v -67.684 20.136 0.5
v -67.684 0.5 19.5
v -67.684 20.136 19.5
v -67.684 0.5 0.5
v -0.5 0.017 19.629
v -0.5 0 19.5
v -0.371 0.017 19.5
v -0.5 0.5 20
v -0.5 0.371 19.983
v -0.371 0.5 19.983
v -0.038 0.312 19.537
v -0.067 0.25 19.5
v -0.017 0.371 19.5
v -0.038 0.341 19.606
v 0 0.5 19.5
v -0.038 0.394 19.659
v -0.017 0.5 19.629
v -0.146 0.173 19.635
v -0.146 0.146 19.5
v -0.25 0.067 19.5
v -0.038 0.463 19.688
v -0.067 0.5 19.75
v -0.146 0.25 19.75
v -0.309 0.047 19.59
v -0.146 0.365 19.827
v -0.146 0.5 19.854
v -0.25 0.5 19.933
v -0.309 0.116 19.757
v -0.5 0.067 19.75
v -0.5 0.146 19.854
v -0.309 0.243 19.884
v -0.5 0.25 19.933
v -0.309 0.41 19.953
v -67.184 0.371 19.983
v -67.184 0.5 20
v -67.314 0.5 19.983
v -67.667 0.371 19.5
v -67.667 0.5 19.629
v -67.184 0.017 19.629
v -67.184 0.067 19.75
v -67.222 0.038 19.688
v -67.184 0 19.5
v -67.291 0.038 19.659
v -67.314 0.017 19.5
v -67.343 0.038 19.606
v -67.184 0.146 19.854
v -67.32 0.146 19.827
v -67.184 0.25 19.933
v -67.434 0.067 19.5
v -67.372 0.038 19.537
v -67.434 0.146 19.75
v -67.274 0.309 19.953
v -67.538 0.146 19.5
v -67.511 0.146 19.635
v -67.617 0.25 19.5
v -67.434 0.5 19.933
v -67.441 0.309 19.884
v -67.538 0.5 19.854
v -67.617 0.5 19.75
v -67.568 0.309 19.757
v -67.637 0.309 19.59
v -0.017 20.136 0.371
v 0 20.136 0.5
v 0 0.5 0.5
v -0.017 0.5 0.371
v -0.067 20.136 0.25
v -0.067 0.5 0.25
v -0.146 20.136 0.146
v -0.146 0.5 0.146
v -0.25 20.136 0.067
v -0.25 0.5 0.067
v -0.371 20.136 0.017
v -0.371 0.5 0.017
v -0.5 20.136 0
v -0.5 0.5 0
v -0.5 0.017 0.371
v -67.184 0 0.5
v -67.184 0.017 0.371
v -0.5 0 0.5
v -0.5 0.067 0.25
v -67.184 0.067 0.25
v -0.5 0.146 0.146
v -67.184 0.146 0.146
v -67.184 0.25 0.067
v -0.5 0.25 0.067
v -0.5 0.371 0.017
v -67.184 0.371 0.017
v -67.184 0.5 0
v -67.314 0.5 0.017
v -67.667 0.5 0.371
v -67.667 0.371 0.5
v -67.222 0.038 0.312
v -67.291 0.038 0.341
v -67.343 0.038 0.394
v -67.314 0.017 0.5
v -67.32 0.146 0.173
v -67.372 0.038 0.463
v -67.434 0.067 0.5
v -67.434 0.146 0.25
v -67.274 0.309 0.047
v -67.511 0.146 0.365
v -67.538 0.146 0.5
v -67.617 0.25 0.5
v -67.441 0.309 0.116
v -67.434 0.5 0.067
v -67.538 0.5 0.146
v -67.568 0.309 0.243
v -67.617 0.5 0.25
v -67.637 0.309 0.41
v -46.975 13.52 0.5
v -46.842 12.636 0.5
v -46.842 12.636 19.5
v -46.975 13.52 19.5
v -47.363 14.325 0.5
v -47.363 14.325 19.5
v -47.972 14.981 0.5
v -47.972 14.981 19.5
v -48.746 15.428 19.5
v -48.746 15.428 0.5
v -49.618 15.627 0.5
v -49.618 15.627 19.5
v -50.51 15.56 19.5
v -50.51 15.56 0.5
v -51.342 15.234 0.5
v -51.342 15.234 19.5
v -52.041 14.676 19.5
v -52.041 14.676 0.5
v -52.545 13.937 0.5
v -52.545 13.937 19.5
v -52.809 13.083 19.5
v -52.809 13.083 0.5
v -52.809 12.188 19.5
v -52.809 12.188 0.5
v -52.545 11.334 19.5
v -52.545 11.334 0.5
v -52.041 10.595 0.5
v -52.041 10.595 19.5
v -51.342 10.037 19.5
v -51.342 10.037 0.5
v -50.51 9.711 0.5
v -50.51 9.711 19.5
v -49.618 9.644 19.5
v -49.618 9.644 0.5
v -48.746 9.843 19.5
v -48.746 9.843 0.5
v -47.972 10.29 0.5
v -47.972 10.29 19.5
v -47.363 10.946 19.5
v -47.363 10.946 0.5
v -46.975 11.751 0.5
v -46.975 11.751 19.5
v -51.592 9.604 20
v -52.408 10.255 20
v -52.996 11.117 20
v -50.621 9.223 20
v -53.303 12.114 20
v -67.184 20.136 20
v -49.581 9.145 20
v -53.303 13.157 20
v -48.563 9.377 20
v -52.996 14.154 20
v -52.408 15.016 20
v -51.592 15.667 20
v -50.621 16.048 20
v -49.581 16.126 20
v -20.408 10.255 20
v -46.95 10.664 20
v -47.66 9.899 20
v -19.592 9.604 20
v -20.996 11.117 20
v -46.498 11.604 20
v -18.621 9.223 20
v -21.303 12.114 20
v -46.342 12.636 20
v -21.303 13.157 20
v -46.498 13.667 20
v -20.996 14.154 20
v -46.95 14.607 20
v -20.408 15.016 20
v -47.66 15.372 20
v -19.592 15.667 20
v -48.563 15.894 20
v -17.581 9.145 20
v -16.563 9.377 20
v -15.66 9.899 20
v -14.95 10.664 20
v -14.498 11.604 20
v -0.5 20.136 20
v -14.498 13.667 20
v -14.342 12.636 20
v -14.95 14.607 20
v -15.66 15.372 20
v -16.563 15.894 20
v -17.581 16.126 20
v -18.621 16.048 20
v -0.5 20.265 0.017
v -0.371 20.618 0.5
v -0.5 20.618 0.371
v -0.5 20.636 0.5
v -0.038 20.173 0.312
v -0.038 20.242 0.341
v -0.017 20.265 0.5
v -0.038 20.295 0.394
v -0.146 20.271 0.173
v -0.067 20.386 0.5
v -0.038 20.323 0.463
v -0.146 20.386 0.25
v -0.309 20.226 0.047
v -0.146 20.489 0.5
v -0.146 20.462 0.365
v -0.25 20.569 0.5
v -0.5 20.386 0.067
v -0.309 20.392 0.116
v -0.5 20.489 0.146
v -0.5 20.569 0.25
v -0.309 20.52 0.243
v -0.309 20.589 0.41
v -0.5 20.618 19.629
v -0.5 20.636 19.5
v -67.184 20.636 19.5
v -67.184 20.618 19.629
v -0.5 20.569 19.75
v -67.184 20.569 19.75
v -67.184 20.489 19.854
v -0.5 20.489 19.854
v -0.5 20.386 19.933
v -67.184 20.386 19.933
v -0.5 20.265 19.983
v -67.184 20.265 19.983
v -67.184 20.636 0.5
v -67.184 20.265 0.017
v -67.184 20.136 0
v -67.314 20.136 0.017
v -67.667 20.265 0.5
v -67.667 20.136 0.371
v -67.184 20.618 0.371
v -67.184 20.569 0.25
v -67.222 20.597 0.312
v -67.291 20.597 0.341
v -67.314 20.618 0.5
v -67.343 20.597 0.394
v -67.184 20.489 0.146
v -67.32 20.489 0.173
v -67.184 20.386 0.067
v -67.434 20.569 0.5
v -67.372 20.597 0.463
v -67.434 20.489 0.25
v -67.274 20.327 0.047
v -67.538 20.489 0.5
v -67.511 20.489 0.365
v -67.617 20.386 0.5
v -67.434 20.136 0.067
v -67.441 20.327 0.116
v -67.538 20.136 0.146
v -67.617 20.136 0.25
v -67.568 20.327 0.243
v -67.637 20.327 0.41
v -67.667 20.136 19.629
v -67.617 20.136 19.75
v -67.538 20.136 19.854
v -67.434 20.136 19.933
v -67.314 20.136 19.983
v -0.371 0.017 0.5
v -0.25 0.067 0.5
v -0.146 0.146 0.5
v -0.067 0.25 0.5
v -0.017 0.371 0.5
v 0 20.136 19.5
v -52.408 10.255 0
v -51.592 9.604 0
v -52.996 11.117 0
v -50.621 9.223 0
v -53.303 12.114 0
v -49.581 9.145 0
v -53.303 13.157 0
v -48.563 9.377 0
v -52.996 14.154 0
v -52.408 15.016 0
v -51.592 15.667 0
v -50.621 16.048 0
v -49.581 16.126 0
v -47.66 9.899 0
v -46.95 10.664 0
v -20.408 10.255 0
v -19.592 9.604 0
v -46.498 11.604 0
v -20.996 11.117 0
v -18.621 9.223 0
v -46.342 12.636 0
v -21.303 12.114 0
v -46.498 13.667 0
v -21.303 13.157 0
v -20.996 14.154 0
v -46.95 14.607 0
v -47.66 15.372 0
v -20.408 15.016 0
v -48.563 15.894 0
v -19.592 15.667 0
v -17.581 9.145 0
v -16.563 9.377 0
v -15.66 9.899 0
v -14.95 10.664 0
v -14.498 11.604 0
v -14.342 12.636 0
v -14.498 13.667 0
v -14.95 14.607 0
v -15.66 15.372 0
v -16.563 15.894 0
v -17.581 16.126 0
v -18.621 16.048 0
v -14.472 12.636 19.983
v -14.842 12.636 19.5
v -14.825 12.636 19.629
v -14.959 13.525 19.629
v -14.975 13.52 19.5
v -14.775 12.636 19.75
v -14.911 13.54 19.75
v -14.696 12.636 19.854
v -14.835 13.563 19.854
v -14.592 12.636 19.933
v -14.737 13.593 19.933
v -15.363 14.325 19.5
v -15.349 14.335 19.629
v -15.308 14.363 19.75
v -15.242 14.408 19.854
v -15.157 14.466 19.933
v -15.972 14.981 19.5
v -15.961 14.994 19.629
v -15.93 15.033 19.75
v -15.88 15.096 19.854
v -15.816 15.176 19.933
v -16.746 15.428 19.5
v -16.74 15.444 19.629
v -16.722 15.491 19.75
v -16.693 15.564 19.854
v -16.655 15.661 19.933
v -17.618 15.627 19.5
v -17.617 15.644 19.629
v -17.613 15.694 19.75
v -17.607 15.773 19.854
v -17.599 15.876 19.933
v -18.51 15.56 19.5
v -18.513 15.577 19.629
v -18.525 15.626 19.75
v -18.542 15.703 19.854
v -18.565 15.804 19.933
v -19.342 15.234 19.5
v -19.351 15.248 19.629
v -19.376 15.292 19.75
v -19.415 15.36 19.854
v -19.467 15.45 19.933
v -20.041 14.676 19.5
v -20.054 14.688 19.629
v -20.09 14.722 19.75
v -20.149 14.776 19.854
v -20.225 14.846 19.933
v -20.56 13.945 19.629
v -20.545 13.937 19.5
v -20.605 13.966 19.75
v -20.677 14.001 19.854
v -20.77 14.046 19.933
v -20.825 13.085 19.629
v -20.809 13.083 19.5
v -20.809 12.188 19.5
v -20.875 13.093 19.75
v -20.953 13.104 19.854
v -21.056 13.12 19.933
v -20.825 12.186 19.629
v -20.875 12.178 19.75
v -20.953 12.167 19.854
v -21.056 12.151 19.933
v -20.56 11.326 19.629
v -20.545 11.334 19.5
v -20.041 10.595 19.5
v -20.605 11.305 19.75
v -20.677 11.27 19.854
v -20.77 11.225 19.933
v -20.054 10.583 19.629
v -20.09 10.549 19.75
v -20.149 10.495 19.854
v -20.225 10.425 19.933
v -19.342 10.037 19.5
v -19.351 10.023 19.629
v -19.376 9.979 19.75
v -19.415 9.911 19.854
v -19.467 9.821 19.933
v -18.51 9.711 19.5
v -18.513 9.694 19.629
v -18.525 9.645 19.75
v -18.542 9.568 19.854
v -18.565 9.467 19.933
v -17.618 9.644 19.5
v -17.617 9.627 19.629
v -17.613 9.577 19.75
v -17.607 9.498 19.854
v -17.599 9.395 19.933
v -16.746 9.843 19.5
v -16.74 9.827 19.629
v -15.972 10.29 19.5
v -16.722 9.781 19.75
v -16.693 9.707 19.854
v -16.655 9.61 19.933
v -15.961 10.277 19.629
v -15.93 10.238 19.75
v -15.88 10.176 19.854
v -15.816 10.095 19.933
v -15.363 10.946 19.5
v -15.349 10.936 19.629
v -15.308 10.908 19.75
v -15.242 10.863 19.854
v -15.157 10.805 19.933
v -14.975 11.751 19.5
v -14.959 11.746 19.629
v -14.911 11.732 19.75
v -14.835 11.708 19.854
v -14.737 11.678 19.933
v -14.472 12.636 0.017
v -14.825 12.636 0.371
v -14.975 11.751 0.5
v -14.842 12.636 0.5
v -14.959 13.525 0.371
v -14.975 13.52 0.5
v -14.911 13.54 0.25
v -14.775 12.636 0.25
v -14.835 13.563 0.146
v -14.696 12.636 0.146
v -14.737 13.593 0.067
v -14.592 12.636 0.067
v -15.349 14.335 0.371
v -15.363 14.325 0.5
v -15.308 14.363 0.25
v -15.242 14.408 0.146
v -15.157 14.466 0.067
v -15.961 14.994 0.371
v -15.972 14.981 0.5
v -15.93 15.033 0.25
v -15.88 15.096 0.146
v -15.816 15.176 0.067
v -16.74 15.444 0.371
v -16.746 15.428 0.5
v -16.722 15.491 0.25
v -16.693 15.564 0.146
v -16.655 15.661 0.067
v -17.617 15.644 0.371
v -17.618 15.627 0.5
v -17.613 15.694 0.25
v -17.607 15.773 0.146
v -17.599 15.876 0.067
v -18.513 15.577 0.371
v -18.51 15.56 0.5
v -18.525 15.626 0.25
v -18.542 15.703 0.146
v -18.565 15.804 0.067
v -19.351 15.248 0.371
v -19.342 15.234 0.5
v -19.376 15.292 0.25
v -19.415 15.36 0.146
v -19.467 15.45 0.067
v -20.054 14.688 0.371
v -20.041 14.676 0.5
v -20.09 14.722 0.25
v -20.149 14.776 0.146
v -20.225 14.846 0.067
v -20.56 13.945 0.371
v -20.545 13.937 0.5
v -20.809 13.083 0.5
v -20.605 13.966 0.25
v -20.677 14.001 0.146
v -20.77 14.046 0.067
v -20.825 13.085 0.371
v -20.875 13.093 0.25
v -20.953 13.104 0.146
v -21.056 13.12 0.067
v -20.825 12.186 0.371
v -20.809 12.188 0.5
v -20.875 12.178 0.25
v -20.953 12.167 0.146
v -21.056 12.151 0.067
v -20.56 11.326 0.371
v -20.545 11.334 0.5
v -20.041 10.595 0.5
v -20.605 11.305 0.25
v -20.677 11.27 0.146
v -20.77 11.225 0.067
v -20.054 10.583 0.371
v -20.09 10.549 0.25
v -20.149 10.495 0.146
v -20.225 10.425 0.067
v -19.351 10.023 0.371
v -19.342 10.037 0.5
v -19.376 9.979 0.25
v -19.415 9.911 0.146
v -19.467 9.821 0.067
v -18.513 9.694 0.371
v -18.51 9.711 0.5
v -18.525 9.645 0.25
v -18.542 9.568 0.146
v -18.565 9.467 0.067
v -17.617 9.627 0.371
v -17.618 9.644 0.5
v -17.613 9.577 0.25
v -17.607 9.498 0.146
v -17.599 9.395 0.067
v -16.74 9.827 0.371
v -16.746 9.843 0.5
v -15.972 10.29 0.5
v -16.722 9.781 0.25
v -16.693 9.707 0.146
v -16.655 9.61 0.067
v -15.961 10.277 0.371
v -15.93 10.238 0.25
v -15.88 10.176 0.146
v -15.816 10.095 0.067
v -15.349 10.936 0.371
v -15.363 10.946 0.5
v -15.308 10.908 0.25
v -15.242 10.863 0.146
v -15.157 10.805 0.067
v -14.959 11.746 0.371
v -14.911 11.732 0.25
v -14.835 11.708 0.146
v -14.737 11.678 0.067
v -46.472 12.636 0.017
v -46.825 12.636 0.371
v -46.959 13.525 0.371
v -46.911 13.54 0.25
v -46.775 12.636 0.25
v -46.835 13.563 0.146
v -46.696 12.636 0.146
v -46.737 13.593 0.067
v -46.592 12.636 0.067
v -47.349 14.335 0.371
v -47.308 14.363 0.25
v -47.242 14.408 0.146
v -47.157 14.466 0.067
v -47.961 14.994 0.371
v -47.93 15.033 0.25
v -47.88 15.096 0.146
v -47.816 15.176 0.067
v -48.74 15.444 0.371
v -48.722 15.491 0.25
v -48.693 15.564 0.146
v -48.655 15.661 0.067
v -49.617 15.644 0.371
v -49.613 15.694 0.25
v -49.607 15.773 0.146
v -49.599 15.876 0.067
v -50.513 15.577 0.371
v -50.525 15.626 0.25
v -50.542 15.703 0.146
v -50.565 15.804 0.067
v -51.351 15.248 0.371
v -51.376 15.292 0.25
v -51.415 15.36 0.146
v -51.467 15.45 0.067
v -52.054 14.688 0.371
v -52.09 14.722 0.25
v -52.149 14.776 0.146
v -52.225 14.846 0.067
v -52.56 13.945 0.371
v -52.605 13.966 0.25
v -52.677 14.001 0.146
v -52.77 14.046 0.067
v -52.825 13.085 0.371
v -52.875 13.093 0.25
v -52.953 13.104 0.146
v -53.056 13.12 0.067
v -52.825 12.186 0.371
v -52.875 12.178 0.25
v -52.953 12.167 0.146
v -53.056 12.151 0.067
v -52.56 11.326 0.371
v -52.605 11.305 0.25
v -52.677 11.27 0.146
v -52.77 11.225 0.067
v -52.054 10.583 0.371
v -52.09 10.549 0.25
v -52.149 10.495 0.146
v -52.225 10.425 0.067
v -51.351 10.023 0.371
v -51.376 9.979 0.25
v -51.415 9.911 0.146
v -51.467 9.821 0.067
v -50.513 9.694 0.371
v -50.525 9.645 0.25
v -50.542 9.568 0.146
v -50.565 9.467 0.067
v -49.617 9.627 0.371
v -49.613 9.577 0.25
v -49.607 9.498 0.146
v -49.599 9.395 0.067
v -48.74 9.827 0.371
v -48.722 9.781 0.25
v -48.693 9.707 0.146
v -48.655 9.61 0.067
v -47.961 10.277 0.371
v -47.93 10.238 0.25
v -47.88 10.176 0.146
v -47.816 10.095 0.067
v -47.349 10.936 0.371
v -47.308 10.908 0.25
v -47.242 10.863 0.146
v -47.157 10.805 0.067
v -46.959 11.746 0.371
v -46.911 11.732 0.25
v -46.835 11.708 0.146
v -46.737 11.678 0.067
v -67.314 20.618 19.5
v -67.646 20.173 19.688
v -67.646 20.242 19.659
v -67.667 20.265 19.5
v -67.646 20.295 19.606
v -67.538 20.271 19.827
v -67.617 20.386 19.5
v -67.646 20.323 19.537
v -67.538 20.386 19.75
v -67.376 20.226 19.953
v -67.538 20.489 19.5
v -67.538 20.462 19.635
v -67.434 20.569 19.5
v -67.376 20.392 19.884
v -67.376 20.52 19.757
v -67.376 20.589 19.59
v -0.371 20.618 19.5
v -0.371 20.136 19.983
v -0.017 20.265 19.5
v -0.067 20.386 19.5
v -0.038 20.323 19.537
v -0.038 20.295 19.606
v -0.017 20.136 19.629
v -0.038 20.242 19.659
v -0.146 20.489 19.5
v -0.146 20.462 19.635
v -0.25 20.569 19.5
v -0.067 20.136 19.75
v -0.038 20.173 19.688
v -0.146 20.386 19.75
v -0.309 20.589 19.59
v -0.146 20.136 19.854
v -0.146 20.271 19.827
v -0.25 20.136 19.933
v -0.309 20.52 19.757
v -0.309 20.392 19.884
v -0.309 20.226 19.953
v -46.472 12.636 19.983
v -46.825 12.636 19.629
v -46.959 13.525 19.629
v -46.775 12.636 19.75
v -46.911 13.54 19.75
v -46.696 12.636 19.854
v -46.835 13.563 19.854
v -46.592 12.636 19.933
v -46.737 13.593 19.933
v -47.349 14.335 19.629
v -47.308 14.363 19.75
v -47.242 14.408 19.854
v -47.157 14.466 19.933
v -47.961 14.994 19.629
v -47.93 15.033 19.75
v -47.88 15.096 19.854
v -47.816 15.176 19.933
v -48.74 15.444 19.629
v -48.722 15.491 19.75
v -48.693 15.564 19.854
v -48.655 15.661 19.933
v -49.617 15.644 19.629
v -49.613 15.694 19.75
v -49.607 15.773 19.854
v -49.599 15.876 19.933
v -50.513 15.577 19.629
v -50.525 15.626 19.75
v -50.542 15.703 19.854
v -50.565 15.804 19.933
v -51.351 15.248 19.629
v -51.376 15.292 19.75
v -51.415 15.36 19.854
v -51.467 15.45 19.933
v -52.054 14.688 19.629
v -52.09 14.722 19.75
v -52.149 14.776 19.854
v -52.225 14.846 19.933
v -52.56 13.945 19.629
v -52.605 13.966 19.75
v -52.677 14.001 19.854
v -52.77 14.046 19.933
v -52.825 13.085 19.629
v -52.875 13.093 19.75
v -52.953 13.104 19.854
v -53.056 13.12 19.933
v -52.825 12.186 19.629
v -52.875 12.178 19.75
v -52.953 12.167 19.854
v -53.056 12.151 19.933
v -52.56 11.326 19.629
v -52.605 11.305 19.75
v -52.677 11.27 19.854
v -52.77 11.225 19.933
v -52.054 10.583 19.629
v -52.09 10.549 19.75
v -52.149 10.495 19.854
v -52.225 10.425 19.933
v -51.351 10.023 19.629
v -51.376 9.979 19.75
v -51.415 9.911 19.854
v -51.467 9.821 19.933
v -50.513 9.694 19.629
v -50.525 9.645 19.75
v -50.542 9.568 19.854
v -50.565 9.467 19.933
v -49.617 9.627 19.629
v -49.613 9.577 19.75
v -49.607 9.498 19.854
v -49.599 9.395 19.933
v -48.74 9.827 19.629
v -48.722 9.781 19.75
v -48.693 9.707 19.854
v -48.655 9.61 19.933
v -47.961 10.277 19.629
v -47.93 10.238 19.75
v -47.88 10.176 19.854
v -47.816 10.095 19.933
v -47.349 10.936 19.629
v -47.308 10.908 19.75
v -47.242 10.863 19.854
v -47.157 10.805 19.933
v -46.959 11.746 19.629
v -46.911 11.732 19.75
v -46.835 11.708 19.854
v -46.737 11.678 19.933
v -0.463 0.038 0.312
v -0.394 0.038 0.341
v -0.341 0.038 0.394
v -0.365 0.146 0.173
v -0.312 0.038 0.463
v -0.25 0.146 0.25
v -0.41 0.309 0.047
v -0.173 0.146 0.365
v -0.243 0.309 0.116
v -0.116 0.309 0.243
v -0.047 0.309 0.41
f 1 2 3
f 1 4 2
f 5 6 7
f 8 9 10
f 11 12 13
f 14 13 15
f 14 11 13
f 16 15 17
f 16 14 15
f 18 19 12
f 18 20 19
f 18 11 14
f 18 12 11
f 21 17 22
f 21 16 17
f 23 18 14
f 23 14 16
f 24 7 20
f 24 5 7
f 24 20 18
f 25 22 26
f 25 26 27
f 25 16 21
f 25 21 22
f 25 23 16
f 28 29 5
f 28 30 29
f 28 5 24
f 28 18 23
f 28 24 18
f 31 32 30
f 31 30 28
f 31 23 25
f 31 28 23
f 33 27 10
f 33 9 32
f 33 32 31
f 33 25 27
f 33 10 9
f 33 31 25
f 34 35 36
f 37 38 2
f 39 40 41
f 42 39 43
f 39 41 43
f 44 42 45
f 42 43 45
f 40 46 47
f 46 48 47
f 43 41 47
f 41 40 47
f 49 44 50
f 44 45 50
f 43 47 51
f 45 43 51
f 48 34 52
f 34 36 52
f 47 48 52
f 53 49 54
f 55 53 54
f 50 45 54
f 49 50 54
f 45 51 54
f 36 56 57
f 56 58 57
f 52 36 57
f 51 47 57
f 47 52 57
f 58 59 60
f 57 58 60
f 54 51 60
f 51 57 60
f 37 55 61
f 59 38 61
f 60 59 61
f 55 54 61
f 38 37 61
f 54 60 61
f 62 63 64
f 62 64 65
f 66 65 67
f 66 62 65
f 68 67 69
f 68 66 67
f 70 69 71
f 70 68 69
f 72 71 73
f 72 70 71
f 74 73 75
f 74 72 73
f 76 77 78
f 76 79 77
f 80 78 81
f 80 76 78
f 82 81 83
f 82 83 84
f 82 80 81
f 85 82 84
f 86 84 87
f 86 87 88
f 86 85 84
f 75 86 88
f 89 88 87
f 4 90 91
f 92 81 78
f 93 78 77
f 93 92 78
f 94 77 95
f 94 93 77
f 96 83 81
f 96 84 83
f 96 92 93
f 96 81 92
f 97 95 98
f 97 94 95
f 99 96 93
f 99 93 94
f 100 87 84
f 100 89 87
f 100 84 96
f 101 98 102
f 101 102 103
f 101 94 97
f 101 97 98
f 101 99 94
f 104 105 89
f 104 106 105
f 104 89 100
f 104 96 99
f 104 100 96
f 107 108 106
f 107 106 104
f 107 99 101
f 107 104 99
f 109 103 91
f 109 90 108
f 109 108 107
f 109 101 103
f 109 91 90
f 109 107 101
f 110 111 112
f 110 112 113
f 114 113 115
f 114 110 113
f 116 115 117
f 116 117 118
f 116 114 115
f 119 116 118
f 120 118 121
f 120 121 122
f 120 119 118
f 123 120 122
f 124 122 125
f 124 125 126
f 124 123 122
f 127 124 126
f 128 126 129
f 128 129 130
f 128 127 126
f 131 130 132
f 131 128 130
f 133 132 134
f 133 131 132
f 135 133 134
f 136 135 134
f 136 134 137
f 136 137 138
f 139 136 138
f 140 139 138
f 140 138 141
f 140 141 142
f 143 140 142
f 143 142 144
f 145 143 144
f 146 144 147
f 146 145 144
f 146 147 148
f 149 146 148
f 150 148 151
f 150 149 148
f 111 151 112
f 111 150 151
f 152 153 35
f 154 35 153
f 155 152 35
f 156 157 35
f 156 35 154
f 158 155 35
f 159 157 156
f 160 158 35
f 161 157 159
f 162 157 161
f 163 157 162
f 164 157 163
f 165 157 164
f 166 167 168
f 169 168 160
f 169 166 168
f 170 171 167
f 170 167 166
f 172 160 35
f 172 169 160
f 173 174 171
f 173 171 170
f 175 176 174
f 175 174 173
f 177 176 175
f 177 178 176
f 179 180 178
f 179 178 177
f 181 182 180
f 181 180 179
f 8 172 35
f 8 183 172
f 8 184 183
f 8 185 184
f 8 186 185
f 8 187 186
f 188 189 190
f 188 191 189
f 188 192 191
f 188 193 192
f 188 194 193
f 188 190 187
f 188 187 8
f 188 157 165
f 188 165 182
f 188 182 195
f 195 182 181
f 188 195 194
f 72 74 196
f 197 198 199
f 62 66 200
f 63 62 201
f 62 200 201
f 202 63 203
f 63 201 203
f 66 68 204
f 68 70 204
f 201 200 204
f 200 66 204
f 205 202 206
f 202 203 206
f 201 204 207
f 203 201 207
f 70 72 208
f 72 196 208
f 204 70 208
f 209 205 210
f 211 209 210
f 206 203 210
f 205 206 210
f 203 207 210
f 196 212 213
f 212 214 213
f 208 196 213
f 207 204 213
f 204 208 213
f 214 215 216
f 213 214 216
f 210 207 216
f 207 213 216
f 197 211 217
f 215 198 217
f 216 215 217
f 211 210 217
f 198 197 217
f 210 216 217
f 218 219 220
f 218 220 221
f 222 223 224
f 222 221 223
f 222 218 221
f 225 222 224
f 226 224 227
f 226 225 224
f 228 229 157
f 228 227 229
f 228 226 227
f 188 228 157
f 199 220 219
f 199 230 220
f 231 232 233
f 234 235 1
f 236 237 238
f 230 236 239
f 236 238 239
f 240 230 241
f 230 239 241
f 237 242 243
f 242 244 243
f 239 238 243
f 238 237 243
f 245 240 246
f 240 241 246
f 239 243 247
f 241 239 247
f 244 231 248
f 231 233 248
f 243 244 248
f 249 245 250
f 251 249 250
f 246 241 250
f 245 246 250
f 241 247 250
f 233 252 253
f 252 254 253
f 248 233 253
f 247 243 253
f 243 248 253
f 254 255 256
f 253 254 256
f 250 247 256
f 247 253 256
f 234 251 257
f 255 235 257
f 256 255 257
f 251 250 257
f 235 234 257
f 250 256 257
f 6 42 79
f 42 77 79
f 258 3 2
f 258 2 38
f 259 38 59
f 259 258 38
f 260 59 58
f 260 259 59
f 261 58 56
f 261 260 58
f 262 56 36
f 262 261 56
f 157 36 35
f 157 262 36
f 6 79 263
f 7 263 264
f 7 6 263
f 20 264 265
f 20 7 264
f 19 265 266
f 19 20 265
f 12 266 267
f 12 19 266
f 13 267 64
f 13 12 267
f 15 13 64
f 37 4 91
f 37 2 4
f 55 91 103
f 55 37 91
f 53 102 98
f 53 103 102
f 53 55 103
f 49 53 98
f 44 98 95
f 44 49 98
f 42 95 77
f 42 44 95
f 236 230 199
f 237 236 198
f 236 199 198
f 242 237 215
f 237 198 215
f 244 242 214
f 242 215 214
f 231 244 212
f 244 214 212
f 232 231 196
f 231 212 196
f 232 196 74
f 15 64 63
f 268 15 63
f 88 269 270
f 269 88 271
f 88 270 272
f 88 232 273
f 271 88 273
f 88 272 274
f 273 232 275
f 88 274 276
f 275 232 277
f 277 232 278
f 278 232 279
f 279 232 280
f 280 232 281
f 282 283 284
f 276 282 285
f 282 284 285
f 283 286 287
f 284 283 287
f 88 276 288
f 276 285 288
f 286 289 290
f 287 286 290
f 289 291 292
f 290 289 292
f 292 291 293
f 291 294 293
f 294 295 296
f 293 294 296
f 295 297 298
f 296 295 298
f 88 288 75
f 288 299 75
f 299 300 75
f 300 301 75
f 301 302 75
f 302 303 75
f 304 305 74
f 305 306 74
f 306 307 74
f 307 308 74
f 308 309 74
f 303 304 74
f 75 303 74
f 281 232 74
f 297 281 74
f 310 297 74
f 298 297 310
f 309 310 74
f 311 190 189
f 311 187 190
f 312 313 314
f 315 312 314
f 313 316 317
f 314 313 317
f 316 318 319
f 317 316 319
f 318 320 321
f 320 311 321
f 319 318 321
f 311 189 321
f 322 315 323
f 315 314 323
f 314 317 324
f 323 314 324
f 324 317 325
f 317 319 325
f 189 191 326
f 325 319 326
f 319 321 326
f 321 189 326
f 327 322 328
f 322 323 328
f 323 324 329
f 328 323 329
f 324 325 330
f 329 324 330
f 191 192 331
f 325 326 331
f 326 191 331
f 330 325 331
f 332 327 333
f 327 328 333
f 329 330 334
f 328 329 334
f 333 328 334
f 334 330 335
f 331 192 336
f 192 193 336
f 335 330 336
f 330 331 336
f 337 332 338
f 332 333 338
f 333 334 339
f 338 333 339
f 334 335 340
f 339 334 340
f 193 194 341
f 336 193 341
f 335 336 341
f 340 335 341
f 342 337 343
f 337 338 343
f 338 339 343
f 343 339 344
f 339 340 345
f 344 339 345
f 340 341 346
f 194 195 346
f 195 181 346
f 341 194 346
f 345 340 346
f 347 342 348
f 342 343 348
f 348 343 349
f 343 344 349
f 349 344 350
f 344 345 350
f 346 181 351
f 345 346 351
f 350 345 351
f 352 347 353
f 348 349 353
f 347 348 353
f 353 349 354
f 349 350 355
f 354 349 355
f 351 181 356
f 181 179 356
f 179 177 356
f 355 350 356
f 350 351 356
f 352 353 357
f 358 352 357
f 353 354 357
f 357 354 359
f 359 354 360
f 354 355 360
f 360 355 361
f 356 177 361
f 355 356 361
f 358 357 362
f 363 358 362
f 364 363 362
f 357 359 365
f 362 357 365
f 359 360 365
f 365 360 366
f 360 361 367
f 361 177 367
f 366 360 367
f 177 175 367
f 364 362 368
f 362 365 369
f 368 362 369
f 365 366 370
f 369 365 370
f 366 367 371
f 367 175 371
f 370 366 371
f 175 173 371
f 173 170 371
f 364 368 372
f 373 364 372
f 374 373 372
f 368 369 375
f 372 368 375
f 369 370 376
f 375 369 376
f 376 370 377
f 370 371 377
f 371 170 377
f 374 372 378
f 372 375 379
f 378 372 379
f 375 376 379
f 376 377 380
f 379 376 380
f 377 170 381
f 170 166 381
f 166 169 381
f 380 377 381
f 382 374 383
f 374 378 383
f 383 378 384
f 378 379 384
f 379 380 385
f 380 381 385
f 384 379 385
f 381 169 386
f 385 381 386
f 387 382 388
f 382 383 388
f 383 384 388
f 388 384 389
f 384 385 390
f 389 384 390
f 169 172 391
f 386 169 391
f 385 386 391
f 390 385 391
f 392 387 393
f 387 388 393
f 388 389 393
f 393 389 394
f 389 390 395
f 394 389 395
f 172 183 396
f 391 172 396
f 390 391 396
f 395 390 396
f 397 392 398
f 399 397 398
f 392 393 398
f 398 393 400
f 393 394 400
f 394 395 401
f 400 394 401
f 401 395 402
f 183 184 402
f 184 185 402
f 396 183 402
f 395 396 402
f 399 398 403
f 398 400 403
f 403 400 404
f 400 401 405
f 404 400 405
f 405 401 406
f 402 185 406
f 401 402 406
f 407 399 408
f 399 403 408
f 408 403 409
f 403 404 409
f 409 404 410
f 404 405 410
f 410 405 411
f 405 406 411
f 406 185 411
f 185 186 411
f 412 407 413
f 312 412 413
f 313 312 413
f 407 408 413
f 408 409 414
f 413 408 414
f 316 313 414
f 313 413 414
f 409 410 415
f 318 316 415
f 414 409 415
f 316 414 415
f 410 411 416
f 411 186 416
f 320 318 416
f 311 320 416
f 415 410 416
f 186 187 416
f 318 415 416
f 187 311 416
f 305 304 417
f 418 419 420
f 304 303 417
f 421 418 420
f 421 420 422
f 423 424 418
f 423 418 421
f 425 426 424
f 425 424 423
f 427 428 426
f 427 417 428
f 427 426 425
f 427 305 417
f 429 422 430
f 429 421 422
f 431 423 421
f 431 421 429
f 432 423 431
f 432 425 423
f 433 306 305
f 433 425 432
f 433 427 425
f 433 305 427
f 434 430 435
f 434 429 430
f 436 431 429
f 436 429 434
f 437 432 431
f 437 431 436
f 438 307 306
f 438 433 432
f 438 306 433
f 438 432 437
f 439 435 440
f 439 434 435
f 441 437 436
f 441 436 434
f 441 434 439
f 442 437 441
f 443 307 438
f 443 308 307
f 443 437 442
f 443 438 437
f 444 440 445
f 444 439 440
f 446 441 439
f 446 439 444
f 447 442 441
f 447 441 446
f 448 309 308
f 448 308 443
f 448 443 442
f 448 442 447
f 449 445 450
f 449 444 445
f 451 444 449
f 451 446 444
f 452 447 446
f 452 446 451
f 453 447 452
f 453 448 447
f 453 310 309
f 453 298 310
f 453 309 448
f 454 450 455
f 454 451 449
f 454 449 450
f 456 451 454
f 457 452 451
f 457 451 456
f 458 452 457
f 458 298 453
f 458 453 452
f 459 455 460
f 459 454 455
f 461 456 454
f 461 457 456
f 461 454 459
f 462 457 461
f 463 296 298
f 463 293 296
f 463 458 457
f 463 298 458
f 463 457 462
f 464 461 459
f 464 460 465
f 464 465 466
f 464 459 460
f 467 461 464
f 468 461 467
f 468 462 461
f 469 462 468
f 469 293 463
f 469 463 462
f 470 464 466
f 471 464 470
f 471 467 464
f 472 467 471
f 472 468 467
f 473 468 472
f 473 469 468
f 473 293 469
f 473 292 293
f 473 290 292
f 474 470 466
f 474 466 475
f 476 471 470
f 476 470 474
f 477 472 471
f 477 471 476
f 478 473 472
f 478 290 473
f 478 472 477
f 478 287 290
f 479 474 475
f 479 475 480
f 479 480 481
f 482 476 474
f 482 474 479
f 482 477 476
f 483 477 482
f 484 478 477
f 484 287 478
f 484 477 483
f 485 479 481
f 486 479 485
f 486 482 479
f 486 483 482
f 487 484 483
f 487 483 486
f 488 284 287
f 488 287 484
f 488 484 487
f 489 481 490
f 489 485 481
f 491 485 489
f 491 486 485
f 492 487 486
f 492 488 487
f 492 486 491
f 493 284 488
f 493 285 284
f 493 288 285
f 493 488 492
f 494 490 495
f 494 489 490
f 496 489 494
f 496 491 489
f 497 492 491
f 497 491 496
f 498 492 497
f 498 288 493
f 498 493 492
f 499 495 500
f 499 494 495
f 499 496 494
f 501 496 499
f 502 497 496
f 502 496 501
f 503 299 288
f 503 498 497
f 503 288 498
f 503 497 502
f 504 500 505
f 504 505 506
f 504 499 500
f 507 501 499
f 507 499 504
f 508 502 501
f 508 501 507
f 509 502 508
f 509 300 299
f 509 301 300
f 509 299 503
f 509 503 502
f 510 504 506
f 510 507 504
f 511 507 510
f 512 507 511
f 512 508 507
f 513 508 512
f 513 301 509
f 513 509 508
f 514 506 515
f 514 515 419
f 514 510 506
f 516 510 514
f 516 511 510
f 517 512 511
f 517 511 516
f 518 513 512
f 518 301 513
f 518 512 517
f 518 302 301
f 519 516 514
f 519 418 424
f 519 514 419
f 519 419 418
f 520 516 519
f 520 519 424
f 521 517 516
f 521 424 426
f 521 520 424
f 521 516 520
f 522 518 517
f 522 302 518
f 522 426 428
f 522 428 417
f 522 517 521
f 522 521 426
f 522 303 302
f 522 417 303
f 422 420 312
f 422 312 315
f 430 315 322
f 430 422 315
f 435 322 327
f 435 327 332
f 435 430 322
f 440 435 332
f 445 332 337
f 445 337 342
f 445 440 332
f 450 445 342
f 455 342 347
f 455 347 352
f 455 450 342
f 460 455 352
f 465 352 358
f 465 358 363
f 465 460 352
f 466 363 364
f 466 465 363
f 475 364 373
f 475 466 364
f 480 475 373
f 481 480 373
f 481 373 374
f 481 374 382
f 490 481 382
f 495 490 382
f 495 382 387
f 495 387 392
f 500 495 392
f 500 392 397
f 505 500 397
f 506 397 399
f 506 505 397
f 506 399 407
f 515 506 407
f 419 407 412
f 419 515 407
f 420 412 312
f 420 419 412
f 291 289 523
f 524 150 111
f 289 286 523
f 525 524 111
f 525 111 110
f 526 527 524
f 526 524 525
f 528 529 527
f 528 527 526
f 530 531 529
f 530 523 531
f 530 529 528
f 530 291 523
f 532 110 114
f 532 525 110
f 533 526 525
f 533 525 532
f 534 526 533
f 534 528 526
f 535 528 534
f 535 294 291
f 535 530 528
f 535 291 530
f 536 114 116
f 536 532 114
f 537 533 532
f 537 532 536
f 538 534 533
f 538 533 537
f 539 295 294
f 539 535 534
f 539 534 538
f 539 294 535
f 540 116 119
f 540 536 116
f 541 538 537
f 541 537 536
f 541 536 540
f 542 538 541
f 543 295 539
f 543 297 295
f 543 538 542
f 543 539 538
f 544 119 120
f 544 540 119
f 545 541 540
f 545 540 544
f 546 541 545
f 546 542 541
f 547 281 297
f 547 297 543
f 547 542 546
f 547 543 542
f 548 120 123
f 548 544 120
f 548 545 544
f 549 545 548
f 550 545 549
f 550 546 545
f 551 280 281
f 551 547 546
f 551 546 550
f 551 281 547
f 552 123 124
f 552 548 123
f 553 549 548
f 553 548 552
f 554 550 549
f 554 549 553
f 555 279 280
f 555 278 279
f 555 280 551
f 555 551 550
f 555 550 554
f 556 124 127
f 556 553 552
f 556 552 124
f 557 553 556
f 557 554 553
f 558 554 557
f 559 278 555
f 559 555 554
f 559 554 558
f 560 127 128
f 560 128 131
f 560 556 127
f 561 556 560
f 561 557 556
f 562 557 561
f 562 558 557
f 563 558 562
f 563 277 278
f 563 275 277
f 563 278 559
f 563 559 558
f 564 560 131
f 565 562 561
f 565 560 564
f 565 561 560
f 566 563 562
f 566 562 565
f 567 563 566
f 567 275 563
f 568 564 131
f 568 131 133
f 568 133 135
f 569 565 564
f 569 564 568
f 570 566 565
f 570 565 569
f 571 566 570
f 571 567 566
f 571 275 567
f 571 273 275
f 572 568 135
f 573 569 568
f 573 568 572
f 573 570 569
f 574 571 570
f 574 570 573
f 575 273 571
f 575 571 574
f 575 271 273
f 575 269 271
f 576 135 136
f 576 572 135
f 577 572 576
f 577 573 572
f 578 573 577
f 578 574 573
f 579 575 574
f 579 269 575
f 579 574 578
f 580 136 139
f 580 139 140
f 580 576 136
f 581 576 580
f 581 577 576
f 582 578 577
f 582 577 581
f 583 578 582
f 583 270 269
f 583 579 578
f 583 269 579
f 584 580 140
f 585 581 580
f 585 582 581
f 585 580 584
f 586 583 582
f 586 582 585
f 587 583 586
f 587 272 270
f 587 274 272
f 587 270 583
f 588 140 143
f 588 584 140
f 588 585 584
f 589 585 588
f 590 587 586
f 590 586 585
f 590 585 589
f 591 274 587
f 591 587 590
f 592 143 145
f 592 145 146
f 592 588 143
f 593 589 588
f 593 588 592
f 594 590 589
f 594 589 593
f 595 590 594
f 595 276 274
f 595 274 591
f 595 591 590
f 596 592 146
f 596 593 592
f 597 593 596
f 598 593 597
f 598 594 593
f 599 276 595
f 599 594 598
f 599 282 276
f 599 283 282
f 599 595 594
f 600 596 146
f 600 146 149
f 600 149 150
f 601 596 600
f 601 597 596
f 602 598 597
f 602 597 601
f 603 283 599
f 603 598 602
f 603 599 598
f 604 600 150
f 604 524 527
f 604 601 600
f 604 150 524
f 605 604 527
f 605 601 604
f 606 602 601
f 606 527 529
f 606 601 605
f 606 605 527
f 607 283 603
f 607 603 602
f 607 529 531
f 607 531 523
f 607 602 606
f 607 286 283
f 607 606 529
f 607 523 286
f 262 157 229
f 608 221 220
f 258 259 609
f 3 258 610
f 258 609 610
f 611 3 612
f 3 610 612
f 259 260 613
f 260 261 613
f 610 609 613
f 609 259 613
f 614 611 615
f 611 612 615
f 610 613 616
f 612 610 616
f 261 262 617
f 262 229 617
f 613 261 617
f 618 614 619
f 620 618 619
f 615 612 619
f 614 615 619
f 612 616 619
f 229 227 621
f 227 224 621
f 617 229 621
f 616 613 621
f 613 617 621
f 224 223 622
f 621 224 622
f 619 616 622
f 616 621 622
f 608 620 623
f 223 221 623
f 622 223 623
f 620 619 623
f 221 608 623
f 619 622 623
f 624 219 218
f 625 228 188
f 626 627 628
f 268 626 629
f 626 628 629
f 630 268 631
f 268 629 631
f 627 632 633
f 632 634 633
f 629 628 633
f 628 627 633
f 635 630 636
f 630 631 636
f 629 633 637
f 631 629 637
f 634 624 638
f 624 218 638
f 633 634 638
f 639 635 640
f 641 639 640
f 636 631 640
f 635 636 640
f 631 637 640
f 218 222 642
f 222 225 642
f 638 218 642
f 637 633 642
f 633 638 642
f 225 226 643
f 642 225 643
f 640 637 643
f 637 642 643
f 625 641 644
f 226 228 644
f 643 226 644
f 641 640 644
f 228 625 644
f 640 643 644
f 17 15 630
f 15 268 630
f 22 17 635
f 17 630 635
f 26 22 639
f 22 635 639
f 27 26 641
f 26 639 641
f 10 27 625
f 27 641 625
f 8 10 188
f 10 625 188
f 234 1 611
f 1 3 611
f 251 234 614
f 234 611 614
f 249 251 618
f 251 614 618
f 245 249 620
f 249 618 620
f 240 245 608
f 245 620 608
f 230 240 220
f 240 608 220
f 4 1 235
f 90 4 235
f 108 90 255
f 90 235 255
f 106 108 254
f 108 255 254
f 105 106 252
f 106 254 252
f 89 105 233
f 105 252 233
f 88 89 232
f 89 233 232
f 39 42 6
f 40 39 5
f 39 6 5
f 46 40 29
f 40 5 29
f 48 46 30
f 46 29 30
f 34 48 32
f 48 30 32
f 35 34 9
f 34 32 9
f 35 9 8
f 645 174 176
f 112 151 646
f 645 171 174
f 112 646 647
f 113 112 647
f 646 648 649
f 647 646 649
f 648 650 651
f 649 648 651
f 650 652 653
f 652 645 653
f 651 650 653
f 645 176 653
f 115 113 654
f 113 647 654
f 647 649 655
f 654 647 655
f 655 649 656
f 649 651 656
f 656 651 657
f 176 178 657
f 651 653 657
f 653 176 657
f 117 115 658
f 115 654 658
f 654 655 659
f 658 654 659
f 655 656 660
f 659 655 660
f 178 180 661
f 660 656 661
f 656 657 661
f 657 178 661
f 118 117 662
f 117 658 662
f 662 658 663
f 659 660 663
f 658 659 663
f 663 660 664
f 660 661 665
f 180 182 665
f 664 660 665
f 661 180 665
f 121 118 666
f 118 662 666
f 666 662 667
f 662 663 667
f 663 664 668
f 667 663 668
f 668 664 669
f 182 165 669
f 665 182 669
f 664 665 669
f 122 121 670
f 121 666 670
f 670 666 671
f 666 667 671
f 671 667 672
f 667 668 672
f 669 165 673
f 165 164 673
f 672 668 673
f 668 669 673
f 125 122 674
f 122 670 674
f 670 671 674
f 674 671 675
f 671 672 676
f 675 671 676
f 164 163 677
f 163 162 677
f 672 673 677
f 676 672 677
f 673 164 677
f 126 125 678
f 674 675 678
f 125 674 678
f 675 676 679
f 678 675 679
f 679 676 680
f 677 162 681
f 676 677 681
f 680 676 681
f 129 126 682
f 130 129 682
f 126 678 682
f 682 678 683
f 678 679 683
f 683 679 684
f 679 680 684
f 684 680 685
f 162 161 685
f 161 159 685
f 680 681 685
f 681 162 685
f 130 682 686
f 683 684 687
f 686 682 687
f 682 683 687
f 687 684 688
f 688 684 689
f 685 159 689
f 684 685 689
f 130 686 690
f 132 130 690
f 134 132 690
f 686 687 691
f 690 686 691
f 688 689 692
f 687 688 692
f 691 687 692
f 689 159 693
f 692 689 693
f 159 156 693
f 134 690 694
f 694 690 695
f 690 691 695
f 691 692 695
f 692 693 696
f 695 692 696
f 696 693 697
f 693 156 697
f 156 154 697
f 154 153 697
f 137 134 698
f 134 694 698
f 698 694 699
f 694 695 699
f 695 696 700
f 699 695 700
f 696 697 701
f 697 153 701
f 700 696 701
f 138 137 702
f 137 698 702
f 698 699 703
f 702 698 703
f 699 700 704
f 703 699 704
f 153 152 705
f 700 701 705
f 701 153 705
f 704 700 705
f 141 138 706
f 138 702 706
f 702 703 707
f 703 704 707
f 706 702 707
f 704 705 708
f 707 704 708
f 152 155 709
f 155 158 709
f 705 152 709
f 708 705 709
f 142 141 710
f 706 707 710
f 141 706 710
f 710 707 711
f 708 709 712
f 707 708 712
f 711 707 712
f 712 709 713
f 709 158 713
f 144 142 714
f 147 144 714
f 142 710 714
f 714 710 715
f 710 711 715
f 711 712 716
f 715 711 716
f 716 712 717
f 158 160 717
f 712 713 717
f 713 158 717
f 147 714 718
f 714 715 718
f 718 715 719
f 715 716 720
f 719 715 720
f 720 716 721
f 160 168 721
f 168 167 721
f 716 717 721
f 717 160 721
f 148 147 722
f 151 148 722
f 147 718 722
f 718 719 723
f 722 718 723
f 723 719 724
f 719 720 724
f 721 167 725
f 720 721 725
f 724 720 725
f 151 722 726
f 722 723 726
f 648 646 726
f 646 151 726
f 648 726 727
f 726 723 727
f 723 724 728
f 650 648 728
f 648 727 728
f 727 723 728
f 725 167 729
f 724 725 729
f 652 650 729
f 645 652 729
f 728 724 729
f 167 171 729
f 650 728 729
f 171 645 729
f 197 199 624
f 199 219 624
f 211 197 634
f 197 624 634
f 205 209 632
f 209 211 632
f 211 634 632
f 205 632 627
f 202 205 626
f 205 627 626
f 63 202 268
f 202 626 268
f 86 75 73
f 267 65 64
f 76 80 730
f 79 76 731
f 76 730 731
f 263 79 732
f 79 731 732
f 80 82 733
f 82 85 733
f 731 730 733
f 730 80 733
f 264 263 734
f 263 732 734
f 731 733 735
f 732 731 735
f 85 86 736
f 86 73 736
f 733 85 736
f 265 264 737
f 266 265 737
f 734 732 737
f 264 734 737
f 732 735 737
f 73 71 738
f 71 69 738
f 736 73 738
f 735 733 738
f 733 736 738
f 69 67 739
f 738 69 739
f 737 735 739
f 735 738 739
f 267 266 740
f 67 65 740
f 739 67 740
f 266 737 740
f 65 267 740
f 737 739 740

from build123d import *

# Parameters (mm, degrees)
SKETCH1_W           = 67.684274796
SKETCH1_H           = 20.635526277
SKETCH1_R           = 3
BOSS_EXTRUDE1_DEPTH = 20
FILLET1_R           = 0.5


with BuildPart() as part:
    # Sketch1 → Boss-Extrude1 (new body)
    with BuildSketch(Plane.XY):
        with Locations((-33.842137398, 10.317763139)):
            Rectangle(SKETCH1_W, SKETCH1_H)
        with Locations((-49.842137398, 12.635526277)):
            Circle(SKETCH1_R, mode=Mode.SUBTRACT)
        with Locations((-17.842137398, 12.635526277)):
            Circle(SKETCH1_R, mode=Mode.SUBTRACT)
    extrude(amount=BOSS_EXTRUDE1_DEPTH)

    # Fillet1
    fillet1_edges = [part.edges().sort_by_distance(p)[0] for p in [
        (-52.842137398, 12.635526277, 0),
        (-52.842137398, 12.635526277, 20),
        (-33.842137398, 20.635526277, 20),
        (-20.842137398, 12.635526277, 0),
        (-20.842137398, 12.635526277, 20),
        (-67.684274796, 10.317763139, 20),
        (-33.842137398, 0, 20),
        (-67.684274796, 10.317763139, 0),
        (-33.842137398, 20.635526277, 0),
        (0, 10.317763139, 0),
        (-33.842137398, 0, 0),
        (-67.684274796, 0, 10),
        (-67.684274796, 20.635526277, 10),
        (0, 20.635526277, 10),
        (0, 0, 10),
        (0, 10.317763139, 20),
    ]]
    fillet(fillet1_edges, radius=FILLET1_R)


solid = part.part
